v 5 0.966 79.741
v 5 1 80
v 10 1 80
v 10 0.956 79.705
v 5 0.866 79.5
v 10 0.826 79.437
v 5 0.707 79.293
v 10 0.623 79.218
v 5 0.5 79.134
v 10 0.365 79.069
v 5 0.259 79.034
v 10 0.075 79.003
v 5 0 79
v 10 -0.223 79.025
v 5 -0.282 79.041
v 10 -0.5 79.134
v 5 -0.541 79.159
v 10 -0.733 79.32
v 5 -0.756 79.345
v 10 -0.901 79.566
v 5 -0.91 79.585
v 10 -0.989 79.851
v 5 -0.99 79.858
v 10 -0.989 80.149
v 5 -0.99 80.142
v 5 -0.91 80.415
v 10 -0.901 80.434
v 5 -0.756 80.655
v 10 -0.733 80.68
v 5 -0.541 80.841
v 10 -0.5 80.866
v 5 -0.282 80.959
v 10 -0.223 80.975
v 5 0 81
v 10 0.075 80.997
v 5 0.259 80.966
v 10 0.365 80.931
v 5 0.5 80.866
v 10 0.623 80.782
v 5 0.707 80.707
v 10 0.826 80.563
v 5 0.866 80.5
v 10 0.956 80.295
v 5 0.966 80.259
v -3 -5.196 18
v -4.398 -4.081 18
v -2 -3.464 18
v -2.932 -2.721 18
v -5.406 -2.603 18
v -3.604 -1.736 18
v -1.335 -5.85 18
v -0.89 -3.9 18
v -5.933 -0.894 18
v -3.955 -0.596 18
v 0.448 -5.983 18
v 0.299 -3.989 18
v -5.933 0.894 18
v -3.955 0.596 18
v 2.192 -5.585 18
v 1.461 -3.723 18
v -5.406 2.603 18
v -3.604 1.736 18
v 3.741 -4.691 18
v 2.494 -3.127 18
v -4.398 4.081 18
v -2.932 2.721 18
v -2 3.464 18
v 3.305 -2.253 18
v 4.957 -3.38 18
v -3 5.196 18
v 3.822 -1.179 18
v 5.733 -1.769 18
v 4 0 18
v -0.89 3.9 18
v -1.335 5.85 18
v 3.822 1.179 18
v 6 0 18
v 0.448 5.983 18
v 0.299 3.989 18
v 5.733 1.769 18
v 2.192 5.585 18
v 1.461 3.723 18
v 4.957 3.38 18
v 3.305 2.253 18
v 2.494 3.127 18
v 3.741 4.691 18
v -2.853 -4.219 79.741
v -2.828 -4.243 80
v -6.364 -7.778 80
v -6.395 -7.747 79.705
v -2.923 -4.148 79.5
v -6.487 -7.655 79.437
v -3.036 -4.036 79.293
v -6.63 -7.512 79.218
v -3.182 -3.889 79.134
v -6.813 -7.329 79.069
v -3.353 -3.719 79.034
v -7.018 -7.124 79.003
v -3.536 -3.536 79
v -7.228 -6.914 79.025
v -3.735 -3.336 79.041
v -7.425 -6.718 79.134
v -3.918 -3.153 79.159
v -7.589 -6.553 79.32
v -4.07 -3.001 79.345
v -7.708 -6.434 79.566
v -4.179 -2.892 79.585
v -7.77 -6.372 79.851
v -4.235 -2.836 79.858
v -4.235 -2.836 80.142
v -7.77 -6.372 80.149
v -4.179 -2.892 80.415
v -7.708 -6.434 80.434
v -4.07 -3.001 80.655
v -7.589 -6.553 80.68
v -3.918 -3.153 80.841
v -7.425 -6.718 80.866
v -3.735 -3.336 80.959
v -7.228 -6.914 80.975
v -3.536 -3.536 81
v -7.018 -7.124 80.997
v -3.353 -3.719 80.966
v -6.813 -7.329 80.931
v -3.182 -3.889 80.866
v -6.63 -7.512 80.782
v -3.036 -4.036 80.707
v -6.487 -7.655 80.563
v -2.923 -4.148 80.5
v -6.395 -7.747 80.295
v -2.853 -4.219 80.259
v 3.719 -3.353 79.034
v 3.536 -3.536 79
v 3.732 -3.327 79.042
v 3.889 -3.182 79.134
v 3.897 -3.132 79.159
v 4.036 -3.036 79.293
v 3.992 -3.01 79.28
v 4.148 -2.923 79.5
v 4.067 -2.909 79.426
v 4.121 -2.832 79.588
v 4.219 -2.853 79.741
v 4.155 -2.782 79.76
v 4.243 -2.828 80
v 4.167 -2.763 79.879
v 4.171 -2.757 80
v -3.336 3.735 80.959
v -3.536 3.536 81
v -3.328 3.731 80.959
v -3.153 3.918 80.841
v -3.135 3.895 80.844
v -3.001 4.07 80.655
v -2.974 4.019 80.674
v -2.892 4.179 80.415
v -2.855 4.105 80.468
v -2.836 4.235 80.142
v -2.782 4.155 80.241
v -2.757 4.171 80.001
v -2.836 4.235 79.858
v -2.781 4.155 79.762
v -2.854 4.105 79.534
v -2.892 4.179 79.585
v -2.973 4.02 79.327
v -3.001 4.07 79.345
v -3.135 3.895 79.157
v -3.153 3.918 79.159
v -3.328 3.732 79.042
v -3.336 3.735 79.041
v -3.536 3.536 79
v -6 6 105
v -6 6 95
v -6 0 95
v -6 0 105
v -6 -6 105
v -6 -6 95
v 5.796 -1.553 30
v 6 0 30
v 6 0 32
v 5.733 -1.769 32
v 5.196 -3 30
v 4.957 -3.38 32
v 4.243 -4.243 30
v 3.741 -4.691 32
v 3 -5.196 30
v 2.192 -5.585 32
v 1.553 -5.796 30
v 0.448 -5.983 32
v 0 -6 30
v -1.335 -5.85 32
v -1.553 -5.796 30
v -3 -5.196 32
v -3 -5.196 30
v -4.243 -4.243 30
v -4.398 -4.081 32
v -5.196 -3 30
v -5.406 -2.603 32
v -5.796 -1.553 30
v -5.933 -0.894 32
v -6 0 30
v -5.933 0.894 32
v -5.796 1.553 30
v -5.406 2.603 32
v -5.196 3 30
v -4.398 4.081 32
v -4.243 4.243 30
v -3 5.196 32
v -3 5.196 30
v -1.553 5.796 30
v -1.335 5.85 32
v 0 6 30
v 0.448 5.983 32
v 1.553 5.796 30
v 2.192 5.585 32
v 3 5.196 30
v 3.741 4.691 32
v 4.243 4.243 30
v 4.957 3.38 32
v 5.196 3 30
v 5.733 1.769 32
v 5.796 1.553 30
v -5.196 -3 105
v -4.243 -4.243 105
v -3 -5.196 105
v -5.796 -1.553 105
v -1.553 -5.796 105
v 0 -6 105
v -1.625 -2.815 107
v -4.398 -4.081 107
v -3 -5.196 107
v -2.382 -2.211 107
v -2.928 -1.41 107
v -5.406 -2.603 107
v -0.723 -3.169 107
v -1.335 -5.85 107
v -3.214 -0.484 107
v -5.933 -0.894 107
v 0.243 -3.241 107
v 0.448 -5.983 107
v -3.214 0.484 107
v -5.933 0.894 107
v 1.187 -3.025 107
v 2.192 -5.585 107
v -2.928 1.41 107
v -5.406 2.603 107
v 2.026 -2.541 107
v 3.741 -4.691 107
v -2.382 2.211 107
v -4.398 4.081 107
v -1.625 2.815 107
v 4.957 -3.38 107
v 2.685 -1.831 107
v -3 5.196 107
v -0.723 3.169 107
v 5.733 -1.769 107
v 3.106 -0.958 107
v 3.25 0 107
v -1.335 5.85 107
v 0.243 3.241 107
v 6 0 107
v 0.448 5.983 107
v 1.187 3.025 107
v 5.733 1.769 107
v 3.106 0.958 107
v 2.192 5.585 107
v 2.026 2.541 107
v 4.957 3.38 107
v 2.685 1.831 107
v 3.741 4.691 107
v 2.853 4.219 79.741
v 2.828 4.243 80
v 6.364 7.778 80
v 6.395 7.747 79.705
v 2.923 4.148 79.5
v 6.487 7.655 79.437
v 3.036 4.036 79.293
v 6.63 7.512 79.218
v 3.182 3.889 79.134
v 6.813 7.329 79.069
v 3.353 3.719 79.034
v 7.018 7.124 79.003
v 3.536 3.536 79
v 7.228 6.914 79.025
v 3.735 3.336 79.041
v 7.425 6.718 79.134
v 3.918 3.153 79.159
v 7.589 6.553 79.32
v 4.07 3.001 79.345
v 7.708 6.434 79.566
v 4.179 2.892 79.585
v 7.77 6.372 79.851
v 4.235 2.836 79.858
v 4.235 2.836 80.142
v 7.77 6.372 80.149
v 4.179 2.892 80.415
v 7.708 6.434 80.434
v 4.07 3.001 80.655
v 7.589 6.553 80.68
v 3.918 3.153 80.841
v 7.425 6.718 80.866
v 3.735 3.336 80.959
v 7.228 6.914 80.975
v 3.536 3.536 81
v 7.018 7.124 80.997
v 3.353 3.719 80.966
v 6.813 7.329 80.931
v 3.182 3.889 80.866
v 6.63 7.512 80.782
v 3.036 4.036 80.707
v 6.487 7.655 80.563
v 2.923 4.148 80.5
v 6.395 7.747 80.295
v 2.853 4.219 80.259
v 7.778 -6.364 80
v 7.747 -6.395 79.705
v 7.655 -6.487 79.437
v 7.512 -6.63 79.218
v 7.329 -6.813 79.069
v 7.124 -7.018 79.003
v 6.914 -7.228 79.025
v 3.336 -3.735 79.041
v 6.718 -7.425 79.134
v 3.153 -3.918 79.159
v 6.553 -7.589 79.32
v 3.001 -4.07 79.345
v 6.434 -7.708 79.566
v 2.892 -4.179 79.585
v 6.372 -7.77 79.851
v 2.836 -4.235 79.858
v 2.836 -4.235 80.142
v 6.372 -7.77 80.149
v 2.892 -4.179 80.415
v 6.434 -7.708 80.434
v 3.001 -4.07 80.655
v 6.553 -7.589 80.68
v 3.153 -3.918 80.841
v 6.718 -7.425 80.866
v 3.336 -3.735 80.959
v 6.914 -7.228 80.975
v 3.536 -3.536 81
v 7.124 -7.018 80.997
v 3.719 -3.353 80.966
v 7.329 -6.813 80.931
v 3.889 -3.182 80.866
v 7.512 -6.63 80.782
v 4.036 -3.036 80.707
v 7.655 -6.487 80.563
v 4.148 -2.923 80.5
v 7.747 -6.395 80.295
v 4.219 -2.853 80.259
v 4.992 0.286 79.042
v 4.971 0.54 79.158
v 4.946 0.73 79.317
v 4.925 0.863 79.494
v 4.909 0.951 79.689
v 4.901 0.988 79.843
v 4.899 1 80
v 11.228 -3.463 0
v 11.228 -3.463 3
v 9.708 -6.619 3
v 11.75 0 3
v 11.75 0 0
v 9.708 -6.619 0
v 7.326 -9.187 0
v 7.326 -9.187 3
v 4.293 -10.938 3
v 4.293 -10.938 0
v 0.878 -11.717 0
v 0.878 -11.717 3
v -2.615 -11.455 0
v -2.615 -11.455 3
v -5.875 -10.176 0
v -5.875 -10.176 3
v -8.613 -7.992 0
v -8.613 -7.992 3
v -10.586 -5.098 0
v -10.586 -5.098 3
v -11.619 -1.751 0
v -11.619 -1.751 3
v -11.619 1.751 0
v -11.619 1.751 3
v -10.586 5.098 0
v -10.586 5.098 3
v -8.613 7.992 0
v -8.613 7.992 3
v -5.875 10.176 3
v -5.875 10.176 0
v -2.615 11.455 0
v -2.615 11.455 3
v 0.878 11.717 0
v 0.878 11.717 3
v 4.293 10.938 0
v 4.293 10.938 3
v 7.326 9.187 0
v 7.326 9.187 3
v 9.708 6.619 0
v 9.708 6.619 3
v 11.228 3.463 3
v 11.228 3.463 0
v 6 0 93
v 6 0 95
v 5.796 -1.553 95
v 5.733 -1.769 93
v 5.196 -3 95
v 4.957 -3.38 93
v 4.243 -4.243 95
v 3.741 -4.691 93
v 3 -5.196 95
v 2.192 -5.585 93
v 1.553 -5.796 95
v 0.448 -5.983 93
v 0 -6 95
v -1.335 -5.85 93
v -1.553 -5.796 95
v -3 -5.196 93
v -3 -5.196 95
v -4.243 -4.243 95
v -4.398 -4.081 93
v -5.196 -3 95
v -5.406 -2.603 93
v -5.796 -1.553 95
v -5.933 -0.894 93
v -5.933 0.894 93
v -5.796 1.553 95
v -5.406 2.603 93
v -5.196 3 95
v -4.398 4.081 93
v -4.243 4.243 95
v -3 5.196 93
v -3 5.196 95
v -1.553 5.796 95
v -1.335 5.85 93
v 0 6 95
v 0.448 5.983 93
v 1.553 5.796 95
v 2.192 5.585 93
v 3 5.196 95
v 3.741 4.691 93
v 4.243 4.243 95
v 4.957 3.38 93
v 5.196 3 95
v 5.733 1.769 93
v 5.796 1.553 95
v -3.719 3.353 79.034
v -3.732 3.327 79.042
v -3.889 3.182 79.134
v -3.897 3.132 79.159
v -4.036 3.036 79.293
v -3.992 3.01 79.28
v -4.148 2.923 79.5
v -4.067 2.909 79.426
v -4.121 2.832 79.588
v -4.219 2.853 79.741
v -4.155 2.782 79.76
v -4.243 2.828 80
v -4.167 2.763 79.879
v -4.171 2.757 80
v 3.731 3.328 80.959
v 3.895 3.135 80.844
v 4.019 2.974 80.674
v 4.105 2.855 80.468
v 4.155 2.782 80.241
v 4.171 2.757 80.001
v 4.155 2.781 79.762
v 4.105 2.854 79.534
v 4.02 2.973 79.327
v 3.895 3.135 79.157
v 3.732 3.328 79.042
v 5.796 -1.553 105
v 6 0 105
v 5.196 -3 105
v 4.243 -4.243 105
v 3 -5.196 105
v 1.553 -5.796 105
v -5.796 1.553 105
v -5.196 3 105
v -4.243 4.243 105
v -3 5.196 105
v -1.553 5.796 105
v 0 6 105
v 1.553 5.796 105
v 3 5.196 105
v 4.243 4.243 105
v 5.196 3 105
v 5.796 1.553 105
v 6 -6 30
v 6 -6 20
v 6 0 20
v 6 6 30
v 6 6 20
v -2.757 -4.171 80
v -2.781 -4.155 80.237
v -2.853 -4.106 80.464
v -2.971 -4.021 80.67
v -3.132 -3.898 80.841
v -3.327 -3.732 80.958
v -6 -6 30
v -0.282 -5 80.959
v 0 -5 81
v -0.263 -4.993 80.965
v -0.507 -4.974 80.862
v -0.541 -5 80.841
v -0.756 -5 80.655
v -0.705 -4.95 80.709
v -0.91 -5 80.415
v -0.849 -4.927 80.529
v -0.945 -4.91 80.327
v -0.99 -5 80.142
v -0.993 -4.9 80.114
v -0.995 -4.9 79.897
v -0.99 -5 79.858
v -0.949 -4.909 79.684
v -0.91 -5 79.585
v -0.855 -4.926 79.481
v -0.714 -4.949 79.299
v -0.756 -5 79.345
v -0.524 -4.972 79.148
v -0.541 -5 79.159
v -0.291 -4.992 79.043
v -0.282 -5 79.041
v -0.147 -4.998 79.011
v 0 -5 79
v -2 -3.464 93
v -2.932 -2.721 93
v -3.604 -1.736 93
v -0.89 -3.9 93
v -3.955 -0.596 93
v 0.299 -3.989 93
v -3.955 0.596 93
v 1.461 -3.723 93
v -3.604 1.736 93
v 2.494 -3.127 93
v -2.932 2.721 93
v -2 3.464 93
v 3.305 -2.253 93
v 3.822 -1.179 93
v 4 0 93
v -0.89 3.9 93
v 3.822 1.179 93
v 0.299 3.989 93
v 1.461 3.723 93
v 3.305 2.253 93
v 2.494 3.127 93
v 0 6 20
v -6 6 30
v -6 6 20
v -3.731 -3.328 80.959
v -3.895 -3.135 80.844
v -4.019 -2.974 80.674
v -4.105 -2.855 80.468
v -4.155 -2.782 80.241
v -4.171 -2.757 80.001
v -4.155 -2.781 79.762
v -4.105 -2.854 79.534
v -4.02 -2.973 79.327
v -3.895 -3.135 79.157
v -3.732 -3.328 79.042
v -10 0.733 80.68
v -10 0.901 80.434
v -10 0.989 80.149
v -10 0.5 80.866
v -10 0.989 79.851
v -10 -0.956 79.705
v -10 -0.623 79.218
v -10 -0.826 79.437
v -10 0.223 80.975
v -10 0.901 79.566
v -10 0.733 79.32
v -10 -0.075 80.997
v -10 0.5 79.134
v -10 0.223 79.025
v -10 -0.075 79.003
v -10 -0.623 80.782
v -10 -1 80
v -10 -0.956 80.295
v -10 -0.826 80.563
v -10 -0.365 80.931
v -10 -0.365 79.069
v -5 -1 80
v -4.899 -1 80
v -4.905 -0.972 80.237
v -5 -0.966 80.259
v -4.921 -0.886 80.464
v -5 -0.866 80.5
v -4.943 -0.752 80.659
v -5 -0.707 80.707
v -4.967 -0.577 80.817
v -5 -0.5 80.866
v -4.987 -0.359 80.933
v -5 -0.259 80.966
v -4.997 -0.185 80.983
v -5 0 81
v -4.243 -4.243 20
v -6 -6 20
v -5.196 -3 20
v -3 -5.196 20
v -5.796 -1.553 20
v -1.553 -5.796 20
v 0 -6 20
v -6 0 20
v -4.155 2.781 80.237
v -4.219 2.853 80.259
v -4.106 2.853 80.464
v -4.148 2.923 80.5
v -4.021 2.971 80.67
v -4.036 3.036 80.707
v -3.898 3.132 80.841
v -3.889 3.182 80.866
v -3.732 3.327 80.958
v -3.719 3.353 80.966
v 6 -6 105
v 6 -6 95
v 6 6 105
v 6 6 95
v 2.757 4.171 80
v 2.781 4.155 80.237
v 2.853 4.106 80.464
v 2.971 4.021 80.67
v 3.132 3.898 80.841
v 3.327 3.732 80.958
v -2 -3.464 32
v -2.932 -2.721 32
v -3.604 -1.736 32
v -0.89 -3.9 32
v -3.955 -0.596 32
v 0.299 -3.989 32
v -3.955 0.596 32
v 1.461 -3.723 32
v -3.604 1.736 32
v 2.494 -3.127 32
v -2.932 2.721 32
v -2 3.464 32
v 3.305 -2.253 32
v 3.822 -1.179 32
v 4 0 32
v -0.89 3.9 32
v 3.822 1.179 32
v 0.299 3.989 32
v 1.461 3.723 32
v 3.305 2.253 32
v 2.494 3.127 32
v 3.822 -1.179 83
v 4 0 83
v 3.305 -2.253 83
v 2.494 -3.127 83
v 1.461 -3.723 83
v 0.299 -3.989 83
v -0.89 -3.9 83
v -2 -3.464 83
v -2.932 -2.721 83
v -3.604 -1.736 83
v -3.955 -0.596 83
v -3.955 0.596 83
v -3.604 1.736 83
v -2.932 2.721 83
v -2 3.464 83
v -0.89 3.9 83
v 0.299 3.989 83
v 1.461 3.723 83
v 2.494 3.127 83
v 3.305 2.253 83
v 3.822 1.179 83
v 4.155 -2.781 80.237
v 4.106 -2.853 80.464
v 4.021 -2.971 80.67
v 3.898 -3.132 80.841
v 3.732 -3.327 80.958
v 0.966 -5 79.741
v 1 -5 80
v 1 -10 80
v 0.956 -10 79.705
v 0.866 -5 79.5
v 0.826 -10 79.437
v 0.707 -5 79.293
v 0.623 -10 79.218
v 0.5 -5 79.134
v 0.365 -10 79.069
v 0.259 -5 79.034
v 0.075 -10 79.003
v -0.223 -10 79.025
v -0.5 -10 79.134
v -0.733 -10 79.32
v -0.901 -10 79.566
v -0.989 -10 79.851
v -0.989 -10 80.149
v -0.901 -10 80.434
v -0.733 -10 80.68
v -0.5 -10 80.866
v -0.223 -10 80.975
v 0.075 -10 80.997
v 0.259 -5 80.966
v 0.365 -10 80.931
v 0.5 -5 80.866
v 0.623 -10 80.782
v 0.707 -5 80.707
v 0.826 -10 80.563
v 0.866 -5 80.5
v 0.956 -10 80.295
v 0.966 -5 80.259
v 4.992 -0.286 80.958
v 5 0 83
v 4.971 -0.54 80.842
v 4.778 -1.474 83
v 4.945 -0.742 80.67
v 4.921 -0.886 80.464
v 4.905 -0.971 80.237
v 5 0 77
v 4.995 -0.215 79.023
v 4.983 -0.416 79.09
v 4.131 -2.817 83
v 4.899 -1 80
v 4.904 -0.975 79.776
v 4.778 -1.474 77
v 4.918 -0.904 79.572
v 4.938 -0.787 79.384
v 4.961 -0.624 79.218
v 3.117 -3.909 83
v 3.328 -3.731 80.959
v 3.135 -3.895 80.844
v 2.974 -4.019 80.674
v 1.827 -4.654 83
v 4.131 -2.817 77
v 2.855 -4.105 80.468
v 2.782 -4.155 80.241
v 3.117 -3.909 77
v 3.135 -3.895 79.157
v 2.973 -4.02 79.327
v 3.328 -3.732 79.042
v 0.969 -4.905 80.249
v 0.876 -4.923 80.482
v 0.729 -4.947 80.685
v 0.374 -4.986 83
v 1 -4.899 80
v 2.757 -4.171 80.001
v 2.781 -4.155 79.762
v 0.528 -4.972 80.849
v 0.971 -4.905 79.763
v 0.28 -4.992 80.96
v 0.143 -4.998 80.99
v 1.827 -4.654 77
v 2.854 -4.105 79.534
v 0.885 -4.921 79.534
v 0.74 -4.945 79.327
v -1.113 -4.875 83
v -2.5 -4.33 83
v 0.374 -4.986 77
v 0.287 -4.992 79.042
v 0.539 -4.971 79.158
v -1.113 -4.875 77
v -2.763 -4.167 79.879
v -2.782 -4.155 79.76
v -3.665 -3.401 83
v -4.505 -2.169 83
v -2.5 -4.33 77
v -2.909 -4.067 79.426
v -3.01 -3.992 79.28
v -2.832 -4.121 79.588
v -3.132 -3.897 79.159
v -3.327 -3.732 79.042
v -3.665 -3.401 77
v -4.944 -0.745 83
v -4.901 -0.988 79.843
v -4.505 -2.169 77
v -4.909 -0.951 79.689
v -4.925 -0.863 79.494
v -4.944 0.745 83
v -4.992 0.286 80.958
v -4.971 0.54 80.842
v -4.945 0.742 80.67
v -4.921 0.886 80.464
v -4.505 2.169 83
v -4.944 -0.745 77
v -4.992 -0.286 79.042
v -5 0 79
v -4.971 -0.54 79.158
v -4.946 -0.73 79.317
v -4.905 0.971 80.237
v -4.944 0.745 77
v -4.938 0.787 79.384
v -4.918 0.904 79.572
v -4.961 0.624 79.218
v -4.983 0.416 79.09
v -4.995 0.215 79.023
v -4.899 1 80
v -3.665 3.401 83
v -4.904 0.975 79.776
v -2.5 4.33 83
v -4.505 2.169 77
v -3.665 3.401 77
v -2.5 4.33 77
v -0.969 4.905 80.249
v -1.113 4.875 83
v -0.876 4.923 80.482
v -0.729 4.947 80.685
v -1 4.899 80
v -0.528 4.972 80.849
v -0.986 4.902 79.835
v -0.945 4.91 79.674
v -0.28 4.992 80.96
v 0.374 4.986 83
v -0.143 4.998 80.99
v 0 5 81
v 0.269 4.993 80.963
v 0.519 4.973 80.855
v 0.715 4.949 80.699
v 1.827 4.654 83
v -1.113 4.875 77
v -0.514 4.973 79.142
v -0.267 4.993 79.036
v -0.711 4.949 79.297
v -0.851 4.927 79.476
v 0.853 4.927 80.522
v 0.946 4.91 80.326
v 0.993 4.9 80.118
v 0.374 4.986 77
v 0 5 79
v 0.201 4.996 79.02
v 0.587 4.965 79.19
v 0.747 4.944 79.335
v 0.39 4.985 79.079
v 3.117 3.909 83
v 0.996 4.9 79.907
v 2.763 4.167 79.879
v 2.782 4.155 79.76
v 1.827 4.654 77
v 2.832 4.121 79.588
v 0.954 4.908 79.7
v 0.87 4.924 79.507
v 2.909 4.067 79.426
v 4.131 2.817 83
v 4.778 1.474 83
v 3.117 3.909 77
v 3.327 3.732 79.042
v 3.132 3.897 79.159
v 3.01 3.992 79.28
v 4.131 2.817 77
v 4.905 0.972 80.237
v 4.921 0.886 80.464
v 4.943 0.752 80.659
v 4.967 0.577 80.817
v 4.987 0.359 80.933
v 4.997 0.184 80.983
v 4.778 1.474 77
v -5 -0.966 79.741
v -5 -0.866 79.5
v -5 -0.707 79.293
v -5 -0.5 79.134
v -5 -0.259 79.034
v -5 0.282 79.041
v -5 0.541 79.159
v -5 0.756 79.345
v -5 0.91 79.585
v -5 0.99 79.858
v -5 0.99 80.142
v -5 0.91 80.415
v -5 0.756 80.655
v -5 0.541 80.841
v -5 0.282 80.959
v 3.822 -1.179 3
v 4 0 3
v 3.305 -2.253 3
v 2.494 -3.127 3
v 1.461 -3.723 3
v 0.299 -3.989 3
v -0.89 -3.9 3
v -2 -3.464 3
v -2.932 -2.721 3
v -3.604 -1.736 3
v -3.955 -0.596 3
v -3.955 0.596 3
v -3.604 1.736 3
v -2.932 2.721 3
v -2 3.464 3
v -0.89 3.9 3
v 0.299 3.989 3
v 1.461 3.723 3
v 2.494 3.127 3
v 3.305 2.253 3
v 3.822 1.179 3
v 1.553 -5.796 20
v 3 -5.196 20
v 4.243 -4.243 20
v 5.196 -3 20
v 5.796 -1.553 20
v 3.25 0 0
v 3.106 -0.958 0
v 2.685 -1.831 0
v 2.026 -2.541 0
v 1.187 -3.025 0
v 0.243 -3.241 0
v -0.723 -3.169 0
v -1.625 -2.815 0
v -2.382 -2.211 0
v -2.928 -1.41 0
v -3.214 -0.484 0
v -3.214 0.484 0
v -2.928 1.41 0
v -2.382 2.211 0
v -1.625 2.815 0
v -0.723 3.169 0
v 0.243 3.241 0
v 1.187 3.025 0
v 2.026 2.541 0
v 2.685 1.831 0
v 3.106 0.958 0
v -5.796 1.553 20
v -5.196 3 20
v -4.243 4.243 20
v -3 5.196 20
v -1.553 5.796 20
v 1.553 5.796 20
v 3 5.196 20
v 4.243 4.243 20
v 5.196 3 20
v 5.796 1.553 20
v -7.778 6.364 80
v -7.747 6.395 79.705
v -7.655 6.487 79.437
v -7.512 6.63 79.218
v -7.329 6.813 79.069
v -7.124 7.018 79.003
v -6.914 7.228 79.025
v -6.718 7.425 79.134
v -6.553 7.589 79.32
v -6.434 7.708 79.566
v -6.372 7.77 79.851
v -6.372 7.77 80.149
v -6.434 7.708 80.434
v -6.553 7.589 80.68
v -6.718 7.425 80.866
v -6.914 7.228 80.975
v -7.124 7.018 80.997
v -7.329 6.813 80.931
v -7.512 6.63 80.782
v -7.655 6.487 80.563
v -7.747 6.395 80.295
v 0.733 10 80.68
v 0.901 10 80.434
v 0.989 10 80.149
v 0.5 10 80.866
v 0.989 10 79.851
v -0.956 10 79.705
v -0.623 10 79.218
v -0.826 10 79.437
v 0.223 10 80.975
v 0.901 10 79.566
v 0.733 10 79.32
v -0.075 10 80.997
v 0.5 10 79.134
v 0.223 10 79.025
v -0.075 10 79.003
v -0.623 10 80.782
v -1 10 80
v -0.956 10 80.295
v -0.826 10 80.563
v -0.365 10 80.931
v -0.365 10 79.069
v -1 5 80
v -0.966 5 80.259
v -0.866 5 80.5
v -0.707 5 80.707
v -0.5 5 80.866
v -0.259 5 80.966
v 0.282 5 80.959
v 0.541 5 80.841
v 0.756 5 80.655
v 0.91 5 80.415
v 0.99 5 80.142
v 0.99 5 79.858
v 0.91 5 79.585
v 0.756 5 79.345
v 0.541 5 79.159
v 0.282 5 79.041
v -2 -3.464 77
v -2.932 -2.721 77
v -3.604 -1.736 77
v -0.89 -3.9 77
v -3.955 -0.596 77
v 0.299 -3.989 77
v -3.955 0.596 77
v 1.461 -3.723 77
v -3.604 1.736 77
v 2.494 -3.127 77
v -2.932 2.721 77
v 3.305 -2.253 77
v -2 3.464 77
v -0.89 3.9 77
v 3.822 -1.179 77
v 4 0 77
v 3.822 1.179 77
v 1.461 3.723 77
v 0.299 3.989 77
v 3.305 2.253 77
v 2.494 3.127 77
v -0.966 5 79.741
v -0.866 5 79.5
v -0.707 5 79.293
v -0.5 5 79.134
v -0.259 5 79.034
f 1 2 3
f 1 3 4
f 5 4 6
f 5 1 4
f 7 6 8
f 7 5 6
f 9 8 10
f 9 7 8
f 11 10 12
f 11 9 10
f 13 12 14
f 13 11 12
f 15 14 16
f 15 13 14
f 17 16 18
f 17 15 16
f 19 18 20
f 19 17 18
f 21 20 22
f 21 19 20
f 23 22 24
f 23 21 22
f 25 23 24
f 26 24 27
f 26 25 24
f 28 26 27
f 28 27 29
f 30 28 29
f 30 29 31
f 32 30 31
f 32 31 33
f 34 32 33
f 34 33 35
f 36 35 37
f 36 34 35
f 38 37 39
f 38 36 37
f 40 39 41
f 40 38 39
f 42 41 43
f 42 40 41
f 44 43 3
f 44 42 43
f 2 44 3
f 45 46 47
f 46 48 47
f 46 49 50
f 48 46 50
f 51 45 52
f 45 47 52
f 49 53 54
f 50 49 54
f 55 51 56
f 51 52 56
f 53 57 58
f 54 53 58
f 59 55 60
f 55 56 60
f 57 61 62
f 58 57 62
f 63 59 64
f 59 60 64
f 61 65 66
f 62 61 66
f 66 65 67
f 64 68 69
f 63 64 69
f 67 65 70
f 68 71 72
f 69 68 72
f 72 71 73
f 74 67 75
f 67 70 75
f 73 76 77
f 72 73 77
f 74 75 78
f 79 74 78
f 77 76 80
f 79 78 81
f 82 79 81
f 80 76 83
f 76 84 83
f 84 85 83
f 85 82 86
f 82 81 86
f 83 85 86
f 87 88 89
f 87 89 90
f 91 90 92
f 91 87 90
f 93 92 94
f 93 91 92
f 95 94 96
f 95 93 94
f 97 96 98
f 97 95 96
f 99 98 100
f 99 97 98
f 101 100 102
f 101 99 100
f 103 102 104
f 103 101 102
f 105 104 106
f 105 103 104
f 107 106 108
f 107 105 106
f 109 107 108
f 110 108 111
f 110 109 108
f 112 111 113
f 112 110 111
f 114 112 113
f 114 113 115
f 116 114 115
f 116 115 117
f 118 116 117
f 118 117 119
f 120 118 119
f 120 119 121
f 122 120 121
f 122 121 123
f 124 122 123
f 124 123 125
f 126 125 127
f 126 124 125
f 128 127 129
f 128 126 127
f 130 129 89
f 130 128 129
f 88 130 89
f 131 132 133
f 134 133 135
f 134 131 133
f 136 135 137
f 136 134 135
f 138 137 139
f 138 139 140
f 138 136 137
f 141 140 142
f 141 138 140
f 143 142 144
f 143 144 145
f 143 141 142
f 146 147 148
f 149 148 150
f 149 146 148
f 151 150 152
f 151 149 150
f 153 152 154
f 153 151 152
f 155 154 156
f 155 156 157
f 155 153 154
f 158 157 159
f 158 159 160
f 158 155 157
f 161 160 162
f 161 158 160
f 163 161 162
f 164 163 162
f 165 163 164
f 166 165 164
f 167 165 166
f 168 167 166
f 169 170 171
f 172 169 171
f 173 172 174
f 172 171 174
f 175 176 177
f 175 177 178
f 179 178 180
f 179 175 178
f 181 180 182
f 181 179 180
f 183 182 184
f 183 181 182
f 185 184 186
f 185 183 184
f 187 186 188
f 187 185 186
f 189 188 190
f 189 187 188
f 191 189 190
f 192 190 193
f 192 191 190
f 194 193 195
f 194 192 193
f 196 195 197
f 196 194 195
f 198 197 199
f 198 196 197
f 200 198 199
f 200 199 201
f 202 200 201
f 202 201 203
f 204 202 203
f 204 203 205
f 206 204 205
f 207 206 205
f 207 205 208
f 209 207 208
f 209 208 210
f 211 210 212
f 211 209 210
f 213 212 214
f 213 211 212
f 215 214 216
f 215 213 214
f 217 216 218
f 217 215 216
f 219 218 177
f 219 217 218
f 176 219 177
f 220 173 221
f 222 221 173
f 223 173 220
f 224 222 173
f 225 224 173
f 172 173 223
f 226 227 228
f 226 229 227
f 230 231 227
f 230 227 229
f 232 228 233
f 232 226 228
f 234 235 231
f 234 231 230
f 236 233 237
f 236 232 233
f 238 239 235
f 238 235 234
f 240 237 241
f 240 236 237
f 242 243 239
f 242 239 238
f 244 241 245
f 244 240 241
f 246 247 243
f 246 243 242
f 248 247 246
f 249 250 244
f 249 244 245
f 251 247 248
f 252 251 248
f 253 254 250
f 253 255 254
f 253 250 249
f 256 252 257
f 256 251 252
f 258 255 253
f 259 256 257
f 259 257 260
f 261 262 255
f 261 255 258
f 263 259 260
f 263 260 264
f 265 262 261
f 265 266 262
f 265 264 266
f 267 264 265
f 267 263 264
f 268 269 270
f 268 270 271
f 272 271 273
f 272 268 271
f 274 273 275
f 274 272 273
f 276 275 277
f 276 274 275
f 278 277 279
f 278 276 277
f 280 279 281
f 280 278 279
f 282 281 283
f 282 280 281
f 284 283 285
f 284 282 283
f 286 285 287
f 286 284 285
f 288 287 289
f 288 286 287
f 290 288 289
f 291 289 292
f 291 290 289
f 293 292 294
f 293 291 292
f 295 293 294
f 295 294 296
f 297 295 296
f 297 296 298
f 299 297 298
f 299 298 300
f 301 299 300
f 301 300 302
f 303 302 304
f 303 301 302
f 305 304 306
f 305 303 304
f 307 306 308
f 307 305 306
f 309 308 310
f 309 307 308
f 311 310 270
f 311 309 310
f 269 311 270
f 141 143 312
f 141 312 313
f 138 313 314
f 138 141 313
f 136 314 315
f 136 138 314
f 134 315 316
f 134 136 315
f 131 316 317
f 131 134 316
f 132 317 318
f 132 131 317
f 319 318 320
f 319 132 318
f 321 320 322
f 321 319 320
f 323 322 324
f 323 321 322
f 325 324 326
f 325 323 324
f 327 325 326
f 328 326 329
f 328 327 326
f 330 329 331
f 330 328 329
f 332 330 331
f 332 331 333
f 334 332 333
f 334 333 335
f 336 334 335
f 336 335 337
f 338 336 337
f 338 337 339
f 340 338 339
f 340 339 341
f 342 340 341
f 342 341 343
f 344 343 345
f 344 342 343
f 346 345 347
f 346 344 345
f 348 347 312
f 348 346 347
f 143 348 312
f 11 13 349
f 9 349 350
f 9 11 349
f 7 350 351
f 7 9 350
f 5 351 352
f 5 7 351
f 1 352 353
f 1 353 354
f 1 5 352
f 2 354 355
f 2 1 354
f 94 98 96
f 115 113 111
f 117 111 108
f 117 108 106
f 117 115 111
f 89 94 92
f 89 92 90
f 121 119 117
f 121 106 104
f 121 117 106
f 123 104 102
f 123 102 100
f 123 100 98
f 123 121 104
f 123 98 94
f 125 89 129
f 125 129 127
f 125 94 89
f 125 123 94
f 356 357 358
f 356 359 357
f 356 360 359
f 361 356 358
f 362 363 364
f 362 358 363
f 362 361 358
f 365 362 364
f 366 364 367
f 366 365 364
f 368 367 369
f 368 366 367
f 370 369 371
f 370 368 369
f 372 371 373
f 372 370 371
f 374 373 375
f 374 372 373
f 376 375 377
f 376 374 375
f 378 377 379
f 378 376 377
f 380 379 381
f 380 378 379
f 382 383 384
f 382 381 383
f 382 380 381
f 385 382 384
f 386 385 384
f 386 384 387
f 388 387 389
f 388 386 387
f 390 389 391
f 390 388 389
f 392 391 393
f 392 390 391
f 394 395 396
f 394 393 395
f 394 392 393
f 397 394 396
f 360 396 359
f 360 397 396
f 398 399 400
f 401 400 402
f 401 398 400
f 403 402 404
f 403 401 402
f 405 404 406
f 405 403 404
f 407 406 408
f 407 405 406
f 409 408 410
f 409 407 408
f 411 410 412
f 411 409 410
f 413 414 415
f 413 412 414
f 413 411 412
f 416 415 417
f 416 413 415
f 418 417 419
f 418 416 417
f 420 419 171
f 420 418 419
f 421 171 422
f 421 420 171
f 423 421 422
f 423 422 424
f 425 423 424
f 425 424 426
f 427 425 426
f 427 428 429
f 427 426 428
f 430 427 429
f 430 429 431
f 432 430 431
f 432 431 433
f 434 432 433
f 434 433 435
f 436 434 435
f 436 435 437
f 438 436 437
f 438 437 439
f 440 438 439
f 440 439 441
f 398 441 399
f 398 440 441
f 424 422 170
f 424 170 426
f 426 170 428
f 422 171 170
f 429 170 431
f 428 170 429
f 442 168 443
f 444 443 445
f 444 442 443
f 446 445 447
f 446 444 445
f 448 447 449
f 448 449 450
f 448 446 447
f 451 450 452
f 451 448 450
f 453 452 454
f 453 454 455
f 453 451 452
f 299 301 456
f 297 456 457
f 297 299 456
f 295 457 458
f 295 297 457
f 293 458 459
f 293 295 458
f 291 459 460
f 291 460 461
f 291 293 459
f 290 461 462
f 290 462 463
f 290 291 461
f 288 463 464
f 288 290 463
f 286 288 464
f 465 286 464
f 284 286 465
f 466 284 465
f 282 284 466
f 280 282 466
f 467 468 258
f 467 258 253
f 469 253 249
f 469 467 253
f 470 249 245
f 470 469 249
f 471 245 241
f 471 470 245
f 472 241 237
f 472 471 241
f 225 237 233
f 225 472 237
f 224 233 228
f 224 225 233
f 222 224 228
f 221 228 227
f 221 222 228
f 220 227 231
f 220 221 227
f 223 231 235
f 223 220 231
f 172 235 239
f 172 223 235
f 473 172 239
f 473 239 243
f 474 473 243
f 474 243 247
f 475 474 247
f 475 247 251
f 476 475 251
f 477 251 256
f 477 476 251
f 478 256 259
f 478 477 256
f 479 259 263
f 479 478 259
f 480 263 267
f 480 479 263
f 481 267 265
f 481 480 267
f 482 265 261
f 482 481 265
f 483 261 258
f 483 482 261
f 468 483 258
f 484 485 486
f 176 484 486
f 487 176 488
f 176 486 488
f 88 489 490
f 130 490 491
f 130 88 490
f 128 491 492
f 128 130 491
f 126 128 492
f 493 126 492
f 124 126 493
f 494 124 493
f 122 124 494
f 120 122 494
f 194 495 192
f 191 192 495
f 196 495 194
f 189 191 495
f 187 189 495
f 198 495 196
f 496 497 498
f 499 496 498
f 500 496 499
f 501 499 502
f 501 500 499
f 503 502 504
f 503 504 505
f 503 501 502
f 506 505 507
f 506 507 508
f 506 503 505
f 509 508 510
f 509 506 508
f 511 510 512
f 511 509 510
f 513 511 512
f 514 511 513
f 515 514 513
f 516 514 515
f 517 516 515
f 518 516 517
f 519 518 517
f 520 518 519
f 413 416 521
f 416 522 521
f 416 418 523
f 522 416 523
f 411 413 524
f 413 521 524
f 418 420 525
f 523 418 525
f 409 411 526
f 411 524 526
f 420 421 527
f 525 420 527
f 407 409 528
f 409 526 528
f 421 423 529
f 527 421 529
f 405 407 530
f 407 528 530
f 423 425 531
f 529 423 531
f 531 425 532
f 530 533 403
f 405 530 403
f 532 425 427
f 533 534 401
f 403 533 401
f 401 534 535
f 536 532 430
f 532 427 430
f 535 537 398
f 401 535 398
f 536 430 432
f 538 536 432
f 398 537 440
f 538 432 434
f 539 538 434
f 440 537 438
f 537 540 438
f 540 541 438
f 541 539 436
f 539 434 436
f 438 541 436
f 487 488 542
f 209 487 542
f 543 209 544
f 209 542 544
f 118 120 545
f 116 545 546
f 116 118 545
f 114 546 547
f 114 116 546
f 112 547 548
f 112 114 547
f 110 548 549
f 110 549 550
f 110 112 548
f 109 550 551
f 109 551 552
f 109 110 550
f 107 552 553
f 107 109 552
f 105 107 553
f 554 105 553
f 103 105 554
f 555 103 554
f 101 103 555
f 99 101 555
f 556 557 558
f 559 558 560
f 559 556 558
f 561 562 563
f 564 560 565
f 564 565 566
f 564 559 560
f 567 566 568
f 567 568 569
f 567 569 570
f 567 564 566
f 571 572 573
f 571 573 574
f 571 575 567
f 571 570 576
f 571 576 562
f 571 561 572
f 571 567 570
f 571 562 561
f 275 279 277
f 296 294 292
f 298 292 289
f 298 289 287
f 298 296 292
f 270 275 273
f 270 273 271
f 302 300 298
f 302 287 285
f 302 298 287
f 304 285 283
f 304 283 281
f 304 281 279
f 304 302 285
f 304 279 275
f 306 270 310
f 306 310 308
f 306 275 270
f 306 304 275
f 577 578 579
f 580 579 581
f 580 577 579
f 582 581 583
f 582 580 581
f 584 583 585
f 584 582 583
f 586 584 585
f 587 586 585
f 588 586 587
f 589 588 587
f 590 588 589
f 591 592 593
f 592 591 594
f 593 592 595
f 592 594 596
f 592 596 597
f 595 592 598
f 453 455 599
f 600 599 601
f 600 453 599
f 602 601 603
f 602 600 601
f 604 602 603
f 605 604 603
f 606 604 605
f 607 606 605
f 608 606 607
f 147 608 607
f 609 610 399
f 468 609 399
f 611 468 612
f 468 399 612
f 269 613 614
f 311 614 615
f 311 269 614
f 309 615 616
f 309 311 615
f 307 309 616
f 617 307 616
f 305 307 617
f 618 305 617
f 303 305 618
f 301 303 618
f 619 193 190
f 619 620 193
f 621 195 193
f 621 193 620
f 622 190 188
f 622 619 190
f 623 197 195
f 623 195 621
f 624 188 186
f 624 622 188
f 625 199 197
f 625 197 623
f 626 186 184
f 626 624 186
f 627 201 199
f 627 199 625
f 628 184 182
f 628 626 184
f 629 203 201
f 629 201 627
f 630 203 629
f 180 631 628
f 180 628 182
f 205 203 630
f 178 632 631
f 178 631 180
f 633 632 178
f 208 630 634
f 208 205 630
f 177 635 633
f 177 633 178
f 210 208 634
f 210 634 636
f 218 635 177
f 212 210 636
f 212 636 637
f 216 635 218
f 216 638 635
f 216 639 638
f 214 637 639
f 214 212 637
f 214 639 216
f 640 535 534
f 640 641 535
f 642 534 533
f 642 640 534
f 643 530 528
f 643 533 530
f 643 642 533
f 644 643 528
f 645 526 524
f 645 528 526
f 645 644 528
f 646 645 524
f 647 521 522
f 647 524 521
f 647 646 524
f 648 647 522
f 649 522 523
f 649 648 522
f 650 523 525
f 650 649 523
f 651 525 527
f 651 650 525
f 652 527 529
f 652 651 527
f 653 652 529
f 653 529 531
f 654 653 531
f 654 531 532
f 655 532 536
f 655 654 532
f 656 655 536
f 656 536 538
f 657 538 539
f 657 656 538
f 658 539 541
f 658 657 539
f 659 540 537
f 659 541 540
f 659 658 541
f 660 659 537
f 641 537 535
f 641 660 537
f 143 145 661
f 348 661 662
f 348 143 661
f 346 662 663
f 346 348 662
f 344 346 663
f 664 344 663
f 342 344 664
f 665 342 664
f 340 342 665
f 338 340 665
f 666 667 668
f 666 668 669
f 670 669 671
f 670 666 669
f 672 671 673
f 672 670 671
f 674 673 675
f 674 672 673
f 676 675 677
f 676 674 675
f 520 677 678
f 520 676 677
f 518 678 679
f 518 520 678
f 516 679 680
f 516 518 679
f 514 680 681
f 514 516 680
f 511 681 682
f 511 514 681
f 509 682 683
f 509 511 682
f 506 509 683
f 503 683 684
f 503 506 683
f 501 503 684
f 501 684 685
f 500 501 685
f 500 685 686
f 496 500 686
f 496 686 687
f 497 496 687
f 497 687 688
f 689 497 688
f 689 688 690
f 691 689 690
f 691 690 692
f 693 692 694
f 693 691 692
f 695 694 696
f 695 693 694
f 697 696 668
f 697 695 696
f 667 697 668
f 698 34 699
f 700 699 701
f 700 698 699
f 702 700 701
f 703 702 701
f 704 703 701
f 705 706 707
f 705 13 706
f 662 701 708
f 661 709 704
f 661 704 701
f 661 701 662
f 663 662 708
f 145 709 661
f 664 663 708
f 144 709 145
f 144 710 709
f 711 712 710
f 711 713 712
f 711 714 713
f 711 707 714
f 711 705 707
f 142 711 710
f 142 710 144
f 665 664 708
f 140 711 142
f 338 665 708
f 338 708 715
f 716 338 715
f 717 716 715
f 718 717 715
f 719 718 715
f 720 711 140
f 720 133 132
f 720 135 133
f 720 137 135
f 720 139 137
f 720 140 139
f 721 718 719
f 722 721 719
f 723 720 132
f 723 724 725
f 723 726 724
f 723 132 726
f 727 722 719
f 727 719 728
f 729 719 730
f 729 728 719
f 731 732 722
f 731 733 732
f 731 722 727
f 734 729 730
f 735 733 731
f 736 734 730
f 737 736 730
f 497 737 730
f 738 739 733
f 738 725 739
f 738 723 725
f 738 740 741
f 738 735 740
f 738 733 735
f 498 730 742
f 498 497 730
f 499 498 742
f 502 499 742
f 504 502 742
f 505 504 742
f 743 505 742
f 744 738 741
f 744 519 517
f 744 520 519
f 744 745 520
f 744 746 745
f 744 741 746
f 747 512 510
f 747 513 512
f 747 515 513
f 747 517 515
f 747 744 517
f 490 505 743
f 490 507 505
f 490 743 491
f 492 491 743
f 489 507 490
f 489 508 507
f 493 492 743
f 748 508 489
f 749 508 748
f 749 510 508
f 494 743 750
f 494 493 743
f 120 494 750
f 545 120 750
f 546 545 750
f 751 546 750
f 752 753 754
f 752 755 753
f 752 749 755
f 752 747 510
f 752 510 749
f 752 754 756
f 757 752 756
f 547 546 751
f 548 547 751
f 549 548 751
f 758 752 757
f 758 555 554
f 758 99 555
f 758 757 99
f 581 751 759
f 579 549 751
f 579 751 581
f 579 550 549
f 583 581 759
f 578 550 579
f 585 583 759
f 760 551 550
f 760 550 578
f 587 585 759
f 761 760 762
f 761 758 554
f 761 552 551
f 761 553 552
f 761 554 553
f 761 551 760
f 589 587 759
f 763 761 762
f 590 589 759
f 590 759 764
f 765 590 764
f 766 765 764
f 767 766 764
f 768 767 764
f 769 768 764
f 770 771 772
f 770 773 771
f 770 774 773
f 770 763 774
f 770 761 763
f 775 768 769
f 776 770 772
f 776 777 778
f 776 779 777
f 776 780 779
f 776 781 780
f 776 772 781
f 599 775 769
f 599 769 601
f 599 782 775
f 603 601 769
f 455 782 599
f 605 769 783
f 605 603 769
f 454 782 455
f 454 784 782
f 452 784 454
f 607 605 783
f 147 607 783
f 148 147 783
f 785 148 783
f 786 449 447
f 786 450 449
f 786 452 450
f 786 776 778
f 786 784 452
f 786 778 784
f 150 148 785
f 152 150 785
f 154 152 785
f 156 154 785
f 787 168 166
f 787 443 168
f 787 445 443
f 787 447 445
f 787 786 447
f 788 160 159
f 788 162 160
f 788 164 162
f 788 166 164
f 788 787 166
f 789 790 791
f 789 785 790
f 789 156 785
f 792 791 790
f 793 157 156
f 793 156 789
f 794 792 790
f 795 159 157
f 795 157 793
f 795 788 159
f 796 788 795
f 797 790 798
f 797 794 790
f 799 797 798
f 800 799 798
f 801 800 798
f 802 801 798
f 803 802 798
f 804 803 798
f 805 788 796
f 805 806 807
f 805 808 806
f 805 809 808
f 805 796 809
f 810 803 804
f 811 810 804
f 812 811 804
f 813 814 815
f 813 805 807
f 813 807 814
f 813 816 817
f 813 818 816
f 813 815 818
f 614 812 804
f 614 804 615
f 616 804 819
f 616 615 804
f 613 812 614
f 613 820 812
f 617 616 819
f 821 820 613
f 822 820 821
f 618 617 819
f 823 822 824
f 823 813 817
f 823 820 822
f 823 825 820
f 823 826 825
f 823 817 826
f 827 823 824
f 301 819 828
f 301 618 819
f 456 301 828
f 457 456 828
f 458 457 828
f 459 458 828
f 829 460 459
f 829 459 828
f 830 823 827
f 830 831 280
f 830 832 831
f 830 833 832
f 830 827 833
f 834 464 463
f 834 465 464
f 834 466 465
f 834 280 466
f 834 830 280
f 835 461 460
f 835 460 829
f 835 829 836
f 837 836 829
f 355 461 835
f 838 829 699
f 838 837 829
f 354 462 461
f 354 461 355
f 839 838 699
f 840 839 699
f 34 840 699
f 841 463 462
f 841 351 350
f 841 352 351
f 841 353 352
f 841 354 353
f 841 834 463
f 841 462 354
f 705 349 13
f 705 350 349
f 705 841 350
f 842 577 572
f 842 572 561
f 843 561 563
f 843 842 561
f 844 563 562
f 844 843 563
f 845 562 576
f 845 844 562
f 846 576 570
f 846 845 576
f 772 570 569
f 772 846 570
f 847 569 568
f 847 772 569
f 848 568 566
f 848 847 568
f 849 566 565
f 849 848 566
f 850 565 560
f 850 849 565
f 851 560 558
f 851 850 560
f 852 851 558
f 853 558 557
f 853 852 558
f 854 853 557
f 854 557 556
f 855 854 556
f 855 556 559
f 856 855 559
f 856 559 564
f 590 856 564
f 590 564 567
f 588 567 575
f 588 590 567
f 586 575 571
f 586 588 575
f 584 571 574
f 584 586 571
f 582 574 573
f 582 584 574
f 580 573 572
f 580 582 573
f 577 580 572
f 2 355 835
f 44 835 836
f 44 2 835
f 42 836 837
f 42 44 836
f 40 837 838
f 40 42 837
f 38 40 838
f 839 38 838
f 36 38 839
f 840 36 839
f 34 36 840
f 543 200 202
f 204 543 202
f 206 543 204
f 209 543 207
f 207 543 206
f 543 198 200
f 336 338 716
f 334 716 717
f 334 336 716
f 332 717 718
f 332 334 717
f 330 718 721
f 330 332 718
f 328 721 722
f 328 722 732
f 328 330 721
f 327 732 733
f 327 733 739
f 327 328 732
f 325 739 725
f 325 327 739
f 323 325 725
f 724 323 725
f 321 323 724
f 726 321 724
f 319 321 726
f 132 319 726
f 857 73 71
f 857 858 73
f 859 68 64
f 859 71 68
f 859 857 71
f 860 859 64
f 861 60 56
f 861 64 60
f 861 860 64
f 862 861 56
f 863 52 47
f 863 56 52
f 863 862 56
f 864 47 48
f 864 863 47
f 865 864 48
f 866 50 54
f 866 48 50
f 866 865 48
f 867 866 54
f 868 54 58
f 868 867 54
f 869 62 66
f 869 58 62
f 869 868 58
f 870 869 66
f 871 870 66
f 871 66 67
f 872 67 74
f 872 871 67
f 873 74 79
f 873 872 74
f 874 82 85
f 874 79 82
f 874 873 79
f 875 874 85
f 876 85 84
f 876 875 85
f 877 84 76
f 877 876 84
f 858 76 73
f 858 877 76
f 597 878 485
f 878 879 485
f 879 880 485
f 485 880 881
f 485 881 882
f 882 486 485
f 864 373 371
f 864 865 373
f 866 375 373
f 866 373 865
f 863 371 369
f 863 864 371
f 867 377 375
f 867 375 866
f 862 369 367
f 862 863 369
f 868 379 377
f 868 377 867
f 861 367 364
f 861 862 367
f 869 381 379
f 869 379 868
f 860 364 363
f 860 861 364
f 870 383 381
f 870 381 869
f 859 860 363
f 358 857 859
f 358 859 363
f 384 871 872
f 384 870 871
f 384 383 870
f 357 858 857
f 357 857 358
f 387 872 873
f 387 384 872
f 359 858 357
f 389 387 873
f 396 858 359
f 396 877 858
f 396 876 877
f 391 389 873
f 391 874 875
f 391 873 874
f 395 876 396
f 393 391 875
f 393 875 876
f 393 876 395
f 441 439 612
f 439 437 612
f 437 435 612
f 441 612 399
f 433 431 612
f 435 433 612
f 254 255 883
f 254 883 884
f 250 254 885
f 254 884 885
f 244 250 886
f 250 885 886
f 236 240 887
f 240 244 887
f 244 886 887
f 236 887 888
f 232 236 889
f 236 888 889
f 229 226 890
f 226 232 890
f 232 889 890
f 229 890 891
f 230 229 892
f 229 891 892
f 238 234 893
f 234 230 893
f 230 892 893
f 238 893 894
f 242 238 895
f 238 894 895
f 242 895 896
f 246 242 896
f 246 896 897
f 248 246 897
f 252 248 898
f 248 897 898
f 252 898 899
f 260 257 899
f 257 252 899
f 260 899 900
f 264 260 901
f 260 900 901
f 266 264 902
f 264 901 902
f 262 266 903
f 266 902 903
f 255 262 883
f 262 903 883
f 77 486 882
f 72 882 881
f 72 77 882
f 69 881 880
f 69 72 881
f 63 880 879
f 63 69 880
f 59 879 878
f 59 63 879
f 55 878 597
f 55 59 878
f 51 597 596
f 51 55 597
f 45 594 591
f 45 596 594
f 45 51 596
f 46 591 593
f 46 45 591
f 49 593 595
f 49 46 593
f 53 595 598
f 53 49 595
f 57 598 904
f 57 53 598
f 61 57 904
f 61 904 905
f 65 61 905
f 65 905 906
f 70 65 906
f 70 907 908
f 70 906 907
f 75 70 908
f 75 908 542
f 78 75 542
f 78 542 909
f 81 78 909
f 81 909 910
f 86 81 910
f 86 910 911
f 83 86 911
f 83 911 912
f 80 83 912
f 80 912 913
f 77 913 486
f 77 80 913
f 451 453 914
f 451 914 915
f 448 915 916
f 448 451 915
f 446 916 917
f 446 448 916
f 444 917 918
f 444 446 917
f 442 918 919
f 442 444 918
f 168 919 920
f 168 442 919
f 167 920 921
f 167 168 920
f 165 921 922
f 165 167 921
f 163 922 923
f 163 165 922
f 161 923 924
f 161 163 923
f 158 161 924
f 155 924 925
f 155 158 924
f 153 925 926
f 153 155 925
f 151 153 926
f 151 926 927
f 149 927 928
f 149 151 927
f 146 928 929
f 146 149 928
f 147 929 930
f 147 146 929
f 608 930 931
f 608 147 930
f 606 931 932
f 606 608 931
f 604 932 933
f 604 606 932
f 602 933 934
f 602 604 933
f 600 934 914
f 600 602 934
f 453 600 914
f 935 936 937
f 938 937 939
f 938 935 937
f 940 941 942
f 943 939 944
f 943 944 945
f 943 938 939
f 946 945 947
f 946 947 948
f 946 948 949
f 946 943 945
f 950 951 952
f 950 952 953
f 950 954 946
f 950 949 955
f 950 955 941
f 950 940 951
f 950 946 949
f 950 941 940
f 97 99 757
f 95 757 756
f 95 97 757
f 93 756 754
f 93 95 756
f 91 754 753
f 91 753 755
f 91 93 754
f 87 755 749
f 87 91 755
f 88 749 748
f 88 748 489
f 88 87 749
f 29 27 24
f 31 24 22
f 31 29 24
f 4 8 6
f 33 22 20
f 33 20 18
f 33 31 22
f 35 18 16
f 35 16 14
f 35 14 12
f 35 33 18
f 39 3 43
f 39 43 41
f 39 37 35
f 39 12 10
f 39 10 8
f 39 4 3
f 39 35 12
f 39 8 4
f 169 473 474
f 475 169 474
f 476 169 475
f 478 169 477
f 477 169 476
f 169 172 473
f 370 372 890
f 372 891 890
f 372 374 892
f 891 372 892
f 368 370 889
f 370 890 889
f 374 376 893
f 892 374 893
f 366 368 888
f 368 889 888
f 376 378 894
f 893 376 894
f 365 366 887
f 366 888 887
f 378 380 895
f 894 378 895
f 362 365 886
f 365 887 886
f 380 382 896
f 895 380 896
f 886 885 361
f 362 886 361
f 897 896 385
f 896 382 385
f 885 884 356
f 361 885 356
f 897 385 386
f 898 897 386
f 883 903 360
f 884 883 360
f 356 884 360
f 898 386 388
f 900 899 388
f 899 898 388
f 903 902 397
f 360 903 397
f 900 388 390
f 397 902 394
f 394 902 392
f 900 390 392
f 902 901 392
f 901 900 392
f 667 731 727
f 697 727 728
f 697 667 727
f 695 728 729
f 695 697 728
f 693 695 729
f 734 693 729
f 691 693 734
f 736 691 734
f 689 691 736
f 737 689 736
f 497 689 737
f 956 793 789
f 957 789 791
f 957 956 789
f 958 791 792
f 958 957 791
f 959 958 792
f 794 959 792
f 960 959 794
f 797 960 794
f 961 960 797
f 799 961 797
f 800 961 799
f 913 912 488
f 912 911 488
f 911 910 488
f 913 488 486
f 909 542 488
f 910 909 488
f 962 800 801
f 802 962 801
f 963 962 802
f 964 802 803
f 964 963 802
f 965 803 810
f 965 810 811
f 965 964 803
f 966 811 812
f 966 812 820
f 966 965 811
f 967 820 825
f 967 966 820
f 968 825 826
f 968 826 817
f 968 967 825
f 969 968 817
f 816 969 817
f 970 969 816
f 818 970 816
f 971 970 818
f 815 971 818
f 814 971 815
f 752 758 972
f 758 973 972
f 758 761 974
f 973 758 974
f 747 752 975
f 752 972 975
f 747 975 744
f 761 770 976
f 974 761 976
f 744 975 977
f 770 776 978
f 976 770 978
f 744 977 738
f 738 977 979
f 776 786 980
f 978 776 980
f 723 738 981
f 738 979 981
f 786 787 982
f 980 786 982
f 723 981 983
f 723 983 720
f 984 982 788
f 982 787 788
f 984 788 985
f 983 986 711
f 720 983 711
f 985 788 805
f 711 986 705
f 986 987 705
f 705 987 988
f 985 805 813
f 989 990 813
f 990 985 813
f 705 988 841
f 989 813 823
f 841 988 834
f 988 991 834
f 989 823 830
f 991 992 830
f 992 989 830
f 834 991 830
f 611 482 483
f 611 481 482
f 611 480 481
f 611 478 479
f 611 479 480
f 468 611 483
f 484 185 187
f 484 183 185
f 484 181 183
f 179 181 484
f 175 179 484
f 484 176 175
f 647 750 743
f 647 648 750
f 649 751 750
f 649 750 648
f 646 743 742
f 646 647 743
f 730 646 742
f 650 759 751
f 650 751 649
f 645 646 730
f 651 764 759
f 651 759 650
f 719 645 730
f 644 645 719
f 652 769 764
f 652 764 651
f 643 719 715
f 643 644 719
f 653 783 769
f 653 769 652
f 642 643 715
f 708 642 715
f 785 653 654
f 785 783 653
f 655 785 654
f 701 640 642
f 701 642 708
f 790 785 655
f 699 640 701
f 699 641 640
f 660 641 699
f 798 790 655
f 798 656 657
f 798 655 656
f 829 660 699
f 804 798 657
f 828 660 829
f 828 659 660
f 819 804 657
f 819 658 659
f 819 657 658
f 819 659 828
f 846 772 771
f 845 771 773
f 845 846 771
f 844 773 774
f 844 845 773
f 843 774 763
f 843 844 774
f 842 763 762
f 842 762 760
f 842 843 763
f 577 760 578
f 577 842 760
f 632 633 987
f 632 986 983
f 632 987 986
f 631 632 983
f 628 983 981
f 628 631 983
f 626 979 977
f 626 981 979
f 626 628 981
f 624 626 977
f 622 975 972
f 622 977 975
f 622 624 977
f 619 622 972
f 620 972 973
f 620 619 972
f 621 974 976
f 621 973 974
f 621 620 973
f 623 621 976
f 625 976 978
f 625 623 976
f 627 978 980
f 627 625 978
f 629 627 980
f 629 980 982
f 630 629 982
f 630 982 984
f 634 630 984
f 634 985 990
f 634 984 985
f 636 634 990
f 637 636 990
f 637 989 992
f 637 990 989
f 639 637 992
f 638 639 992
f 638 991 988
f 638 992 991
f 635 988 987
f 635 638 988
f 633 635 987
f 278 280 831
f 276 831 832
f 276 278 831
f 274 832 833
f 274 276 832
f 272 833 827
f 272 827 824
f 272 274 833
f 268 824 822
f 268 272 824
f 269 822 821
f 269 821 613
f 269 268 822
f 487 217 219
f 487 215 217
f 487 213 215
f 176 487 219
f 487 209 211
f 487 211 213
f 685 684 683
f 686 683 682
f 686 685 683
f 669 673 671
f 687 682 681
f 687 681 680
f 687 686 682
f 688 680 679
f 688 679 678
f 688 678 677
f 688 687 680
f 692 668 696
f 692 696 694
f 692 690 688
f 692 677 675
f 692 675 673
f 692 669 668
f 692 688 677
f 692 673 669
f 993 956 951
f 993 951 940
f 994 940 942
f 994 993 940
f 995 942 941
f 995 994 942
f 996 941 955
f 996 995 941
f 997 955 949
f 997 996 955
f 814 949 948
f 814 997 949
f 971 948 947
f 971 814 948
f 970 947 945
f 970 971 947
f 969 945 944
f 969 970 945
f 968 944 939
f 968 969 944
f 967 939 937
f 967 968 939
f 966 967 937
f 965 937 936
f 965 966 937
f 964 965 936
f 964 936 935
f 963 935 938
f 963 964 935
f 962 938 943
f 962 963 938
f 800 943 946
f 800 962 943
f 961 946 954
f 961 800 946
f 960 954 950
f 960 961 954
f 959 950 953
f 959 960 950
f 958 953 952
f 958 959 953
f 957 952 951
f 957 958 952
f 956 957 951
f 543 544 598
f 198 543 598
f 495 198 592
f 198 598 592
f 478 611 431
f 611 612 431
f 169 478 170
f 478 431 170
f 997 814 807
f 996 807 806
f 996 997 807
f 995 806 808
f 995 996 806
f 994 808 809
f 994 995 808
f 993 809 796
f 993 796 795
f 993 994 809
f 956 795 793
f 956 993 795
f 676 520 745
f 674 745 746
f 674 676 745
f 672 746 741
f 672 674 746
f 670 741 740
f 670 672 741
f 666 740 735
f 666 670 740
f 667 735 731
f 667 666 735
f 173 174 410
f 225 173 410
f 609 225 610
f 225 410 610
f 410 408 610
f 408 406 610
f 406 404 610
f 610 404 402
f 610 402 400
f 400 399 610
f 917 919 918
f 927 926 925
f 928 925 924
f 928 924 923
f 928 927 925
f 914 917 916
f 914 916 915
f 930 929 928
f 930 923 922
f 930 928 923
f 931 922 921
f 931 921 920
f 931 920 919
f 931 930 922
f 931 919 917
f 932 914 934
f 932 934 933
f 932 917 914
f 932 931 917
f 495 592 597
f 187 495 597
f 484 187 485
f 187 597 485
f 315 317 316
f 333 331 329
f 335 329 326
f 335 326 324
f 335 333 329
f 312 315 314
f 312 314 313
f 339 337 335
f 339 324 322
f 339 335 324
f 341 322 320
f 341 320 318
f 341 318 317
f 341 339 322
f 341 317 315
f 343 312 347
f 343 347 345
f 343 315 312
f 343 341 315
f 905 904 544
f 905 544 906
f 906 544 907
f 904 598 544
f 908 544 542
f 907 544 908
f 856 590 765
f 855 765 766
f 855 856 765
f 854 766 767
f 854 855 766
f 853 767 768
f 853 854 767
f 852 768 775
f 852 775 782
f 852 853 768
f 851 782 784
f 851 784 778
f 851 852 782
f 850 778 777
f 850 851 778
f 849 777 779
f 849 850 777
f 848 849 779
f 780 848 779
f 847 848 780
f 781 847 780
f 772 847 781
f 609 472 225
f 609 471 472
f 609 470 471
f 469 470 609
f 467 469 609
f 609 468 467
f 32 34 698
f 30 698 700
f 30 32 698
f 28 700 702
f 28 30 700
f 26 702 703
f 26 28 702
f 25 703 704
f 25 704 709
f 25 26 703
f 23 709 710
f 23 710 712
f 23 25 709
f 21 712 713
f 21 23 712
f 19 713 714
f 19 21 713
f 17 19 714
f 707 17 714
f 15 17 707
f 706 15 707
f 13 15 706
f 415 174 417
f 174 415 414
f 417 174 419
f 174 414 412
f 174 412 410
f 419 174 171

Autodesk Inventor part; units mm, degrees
ref_plane "XZ Plane" through (0, 0, 0) normal (0, 1, 0) x (-1, 0, 0)
ref_plane "XY Plane" through (0, 0, 0) normal (0, 0, 1) x (1, 0, 0)
sketch "Sketch1" plane through (0, 0, 0) normal (0, 0, 1) x (1, 0, 0)
  circle A0 centre (0, 0) radius 3.25
  circle A1 centre (0, 0) radius 11.75
  dimension "d0" = 6.5
  dimension "d1" = 23.5
extrude "Extrusion1" add sketch "Sketch1" along normal blind 3
sketch "Sketch2" plane through (0, 0, 3) normal (0, 0, 1) x (1, 0, 0)
  circle A0 centre (0, 0) radius 3.25 projected
  circle A1 centre (0, 0) radius 4
  dimension "d4" = 8
extrude "Extrusion2" add sketch "Sketch2" along normal blind 15
sketch "Sketch3" plane through (0, 0, 18) normal (0, 0, 1) x (1, 0, 0)
  circle A0 centre (0, 0) radius 3.25 projected
  circle A1 centre (0, 0) radius 6
  dimension "d7" = 12
extrude "Extrusion3" add sketch "Sketch3" along normal blind 2
sketch "Sketch4" plane through (0, 0, 20) normal (0, 0, 1) x (1, 0, 0)
  circle A0 centre (0, 0) radius 3.25 projected
  line L0 (6, 6) -> (-6, 6)
  line L1 (-6, 6) -> (-6, -6)
  line L2 (-6, -6) -> (6, -6)
  line L3 (6, -6) -> (6, 6)
  line L4 (6, 6) -> (-6, -6) construction
  line L5 (-6, 6) -> (6, -6) construction
  circle A1 centre (0, 0) radius 6 projected
extrude "Extrusion4" add sketch "Sketch4" along normal blind 10
sketch "Sketch5" plane through (0, 0, 30) normal (0, 0, 1) x (1, 0, 0)
  circle A0 centre (0, 0) radius 3.25 projected
  circle A1 centre (0, 0) radius 6 projected
extrude "Extrusion5" add sketch "Sketch5" along normal blind 2
sketch "Sketch6" plane through (0, 0, 32) normal (0, 0, 1) x (1, 0, 0)
  circle A0 centre (0, 0) radius 3.25 projected
  circle A1 centre (0, 0) radius 4 projected
extrude "Extrusion6" add sketch "Sketch6" along normal blind 45
sketch "Sketch7" plane through (0, 0, 77) normal (0, 0, 1) x (1, 0, 0)
  circle A0 centre (0, 0) radius 3.25 projected
  circle A1 centre (0, 0) radius 5
  dimension "d16" = 10
extrude "Extrusion7" add sketch "Sketch7" along normal blind 6
sketch "Sketch8" plane through (0, 0, 83) normal (0, 0, 1) x (1, 0, 0)
  circle A0 centre (0, 0) radius 3.25 projected
  circle A1 centre (0, 0) radius 4 projected
extrude "Extrusion8" add sketch "Sketch8" along normal blind 10
sketch "Sketch9" plane through (0, 0, 93) normal (0, 0, 1) x (1, 0, 0)
  circle A0 centre (0, 0) radius 3.25 projected
  circle A1 centre (0, 0) radius 6 projected
extrude "Extrusion9" add sketch "Sketch9" along normal blind 2
sketch "Sketch10" plane through (0, 0, 95) normal (0, 0, 1) x (1, 0, 0)
  circle A0 centre (0, 0) radius 3.25 projected
  line L0 (6, -6) -> (6, 0) projected
  line L1 (0, -6) -> (6, -6) projected
  line L2 (-6, -6) -> (0, -6) projected
  line L3 (-6, 0) -> (-6, -6) projected
  line L4 (-6, 6) -> (-6, 0) projected
  line L5 (0, 6) -> (-6, 6) projected
  line L6 (6, 6) -> (0, 6) projected
  line L7 (6, 0) -> (6, 6) projected
extrude "Extrusion10" add sketch "Sketch10" along normal blind 10
sketch "Sketch11" plane through (0, 0, 105) normal (0, 0, 1) x (1, 0, 0)
  circle A0 centre (0, 0) radius 3.25 projected
  circle A1 centre (0, 0) radius 6 projected
extrude "Extrusion11" add sketch "Sketch11" along normal blind 2
ref_plane "Work Plane1" through (5, 0, 77) normal (1, 0, 0) x (0, 1, 0)
sketch "Sketch12" plane through (5, 0, 77) normal (1, 0, 0) x (0, 1, 0)
  line L0 (5, 0) -> (5, 6) projected
  line L1 (5, 0) -> (-5, 0) projected
  circle A0 centre (0, 3) radius 1
  point P0 (0, -77)
  point P1 (5, 3)
  point P2 (0, 0)
  dimension "d27" = 2
extrude "Extrusion12" add sketch "Sketch12" along normal blind 5 and the other way blind 0.5
pattern_circular "Circular Pattern1" count 8 over 360 about axis through (0, 0, 32) along (0, 0, 1) of "Extrusion12"
properties part number "039"
